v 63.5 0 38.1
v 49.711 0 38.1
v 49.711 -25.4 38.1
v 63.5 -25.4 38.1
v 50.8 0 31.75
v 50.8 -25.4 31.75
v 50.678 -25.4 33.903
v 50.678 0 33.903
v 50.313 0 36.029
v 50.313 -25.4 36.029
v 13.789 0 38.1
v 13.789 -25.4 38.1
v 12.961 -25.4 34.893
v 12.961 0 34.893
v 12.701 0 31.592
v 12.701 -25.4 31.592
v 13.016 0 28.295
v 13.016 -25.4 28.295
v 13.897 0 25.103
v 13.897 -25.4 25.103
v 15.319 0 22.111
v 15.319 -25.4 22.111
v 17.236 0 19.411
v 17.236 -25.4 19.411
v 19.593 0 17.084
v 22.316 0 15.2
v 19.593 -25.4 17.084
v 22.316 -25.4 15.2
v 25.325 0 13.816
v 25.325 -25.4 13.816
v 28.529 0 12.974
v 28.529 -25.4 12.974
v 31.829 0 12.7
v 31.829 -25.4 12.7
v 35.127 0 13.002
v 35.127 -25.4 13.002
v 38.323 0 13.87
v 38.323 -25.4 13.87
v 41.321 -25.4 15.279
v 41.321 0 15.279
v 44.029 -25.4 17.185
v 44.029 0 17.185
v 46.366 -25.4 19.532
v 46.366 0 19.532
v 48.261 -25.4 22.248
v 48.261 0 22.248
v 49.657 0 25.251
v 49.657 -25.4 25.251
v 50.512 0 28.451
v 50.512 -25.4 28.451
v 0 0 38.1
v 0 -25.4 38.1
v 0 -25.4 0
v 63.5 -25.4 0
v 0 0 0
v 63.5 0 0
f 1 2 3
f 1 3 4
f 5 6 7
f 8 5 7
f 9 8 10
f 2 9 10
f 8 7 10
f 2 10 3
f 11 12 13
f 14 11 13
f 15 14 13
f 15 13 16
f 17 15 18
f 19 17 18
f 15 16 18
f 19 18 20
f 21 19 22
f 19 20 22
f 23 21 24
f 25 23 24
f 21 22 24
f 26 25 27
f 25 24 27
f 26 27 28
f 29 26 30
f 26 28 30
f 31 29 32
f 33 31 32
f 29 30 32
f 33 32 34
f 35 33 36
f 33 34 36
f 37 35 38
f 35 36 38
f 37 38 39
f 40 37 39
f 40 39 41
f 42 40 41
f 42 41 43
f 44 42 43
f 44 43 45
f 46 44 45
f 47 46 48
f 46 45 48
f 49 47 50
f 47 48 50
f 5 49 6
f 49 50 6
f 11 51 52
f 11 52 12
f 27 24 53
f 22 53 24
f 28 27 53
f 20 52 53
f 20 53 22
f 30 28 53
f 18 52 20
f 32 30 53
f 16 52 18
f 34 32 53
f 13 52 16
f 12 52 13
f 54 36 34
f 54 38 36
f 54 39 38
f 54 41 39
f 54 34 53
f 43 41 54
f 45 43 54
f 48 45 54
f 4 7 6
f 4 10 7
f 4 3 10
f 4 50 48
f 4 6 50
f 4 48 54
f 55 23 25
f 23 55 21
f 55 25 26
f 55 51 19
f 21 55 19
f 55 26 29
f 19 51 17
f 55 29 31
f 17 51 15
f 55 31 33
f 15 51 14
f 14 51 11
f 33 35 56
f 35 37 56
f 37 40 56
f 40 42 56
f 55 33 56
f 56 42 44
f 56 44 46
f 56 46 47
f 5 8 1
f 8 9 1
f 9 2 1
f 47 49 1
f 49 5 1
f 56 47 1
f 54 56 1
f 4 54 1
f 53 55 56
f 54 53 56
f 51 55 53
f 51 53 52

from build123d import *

# Parameters (mm, degrees)
F0_W     = 63.5
F0_H     = 38.1
F1_DEPTH = 25.4
F3_DEPTH = 25.4


with BuildPart() as f1:
    # F0 (on Front) → F1 (new body)
    with BuildSketch(Plane.XZ):
        with Locations((31.75, 19.05)):
            Rectangle(F0_W, F0_H)
    extrude(amount=F1_DEPTH)

    # F2 (on face) → F3 (cut)
    with BuildSketch(Plane.XZ.offset(25.4)):
        with BuildLine():
            ThreePointArc((13.789488, 38.1), (28.528607, 12.974347), (50.8, 31.75))
            ThreePointArc((50.8, 31.75), (50.525653, 34.971393), (49.710512, 38.1))
            Line((49.710512, 38.1), (13.789488, 38.1))
        make_face()
    extrude(amount=-F3_DEPTH, mode=Mode.SUBTRACT)


solid = f1.part
